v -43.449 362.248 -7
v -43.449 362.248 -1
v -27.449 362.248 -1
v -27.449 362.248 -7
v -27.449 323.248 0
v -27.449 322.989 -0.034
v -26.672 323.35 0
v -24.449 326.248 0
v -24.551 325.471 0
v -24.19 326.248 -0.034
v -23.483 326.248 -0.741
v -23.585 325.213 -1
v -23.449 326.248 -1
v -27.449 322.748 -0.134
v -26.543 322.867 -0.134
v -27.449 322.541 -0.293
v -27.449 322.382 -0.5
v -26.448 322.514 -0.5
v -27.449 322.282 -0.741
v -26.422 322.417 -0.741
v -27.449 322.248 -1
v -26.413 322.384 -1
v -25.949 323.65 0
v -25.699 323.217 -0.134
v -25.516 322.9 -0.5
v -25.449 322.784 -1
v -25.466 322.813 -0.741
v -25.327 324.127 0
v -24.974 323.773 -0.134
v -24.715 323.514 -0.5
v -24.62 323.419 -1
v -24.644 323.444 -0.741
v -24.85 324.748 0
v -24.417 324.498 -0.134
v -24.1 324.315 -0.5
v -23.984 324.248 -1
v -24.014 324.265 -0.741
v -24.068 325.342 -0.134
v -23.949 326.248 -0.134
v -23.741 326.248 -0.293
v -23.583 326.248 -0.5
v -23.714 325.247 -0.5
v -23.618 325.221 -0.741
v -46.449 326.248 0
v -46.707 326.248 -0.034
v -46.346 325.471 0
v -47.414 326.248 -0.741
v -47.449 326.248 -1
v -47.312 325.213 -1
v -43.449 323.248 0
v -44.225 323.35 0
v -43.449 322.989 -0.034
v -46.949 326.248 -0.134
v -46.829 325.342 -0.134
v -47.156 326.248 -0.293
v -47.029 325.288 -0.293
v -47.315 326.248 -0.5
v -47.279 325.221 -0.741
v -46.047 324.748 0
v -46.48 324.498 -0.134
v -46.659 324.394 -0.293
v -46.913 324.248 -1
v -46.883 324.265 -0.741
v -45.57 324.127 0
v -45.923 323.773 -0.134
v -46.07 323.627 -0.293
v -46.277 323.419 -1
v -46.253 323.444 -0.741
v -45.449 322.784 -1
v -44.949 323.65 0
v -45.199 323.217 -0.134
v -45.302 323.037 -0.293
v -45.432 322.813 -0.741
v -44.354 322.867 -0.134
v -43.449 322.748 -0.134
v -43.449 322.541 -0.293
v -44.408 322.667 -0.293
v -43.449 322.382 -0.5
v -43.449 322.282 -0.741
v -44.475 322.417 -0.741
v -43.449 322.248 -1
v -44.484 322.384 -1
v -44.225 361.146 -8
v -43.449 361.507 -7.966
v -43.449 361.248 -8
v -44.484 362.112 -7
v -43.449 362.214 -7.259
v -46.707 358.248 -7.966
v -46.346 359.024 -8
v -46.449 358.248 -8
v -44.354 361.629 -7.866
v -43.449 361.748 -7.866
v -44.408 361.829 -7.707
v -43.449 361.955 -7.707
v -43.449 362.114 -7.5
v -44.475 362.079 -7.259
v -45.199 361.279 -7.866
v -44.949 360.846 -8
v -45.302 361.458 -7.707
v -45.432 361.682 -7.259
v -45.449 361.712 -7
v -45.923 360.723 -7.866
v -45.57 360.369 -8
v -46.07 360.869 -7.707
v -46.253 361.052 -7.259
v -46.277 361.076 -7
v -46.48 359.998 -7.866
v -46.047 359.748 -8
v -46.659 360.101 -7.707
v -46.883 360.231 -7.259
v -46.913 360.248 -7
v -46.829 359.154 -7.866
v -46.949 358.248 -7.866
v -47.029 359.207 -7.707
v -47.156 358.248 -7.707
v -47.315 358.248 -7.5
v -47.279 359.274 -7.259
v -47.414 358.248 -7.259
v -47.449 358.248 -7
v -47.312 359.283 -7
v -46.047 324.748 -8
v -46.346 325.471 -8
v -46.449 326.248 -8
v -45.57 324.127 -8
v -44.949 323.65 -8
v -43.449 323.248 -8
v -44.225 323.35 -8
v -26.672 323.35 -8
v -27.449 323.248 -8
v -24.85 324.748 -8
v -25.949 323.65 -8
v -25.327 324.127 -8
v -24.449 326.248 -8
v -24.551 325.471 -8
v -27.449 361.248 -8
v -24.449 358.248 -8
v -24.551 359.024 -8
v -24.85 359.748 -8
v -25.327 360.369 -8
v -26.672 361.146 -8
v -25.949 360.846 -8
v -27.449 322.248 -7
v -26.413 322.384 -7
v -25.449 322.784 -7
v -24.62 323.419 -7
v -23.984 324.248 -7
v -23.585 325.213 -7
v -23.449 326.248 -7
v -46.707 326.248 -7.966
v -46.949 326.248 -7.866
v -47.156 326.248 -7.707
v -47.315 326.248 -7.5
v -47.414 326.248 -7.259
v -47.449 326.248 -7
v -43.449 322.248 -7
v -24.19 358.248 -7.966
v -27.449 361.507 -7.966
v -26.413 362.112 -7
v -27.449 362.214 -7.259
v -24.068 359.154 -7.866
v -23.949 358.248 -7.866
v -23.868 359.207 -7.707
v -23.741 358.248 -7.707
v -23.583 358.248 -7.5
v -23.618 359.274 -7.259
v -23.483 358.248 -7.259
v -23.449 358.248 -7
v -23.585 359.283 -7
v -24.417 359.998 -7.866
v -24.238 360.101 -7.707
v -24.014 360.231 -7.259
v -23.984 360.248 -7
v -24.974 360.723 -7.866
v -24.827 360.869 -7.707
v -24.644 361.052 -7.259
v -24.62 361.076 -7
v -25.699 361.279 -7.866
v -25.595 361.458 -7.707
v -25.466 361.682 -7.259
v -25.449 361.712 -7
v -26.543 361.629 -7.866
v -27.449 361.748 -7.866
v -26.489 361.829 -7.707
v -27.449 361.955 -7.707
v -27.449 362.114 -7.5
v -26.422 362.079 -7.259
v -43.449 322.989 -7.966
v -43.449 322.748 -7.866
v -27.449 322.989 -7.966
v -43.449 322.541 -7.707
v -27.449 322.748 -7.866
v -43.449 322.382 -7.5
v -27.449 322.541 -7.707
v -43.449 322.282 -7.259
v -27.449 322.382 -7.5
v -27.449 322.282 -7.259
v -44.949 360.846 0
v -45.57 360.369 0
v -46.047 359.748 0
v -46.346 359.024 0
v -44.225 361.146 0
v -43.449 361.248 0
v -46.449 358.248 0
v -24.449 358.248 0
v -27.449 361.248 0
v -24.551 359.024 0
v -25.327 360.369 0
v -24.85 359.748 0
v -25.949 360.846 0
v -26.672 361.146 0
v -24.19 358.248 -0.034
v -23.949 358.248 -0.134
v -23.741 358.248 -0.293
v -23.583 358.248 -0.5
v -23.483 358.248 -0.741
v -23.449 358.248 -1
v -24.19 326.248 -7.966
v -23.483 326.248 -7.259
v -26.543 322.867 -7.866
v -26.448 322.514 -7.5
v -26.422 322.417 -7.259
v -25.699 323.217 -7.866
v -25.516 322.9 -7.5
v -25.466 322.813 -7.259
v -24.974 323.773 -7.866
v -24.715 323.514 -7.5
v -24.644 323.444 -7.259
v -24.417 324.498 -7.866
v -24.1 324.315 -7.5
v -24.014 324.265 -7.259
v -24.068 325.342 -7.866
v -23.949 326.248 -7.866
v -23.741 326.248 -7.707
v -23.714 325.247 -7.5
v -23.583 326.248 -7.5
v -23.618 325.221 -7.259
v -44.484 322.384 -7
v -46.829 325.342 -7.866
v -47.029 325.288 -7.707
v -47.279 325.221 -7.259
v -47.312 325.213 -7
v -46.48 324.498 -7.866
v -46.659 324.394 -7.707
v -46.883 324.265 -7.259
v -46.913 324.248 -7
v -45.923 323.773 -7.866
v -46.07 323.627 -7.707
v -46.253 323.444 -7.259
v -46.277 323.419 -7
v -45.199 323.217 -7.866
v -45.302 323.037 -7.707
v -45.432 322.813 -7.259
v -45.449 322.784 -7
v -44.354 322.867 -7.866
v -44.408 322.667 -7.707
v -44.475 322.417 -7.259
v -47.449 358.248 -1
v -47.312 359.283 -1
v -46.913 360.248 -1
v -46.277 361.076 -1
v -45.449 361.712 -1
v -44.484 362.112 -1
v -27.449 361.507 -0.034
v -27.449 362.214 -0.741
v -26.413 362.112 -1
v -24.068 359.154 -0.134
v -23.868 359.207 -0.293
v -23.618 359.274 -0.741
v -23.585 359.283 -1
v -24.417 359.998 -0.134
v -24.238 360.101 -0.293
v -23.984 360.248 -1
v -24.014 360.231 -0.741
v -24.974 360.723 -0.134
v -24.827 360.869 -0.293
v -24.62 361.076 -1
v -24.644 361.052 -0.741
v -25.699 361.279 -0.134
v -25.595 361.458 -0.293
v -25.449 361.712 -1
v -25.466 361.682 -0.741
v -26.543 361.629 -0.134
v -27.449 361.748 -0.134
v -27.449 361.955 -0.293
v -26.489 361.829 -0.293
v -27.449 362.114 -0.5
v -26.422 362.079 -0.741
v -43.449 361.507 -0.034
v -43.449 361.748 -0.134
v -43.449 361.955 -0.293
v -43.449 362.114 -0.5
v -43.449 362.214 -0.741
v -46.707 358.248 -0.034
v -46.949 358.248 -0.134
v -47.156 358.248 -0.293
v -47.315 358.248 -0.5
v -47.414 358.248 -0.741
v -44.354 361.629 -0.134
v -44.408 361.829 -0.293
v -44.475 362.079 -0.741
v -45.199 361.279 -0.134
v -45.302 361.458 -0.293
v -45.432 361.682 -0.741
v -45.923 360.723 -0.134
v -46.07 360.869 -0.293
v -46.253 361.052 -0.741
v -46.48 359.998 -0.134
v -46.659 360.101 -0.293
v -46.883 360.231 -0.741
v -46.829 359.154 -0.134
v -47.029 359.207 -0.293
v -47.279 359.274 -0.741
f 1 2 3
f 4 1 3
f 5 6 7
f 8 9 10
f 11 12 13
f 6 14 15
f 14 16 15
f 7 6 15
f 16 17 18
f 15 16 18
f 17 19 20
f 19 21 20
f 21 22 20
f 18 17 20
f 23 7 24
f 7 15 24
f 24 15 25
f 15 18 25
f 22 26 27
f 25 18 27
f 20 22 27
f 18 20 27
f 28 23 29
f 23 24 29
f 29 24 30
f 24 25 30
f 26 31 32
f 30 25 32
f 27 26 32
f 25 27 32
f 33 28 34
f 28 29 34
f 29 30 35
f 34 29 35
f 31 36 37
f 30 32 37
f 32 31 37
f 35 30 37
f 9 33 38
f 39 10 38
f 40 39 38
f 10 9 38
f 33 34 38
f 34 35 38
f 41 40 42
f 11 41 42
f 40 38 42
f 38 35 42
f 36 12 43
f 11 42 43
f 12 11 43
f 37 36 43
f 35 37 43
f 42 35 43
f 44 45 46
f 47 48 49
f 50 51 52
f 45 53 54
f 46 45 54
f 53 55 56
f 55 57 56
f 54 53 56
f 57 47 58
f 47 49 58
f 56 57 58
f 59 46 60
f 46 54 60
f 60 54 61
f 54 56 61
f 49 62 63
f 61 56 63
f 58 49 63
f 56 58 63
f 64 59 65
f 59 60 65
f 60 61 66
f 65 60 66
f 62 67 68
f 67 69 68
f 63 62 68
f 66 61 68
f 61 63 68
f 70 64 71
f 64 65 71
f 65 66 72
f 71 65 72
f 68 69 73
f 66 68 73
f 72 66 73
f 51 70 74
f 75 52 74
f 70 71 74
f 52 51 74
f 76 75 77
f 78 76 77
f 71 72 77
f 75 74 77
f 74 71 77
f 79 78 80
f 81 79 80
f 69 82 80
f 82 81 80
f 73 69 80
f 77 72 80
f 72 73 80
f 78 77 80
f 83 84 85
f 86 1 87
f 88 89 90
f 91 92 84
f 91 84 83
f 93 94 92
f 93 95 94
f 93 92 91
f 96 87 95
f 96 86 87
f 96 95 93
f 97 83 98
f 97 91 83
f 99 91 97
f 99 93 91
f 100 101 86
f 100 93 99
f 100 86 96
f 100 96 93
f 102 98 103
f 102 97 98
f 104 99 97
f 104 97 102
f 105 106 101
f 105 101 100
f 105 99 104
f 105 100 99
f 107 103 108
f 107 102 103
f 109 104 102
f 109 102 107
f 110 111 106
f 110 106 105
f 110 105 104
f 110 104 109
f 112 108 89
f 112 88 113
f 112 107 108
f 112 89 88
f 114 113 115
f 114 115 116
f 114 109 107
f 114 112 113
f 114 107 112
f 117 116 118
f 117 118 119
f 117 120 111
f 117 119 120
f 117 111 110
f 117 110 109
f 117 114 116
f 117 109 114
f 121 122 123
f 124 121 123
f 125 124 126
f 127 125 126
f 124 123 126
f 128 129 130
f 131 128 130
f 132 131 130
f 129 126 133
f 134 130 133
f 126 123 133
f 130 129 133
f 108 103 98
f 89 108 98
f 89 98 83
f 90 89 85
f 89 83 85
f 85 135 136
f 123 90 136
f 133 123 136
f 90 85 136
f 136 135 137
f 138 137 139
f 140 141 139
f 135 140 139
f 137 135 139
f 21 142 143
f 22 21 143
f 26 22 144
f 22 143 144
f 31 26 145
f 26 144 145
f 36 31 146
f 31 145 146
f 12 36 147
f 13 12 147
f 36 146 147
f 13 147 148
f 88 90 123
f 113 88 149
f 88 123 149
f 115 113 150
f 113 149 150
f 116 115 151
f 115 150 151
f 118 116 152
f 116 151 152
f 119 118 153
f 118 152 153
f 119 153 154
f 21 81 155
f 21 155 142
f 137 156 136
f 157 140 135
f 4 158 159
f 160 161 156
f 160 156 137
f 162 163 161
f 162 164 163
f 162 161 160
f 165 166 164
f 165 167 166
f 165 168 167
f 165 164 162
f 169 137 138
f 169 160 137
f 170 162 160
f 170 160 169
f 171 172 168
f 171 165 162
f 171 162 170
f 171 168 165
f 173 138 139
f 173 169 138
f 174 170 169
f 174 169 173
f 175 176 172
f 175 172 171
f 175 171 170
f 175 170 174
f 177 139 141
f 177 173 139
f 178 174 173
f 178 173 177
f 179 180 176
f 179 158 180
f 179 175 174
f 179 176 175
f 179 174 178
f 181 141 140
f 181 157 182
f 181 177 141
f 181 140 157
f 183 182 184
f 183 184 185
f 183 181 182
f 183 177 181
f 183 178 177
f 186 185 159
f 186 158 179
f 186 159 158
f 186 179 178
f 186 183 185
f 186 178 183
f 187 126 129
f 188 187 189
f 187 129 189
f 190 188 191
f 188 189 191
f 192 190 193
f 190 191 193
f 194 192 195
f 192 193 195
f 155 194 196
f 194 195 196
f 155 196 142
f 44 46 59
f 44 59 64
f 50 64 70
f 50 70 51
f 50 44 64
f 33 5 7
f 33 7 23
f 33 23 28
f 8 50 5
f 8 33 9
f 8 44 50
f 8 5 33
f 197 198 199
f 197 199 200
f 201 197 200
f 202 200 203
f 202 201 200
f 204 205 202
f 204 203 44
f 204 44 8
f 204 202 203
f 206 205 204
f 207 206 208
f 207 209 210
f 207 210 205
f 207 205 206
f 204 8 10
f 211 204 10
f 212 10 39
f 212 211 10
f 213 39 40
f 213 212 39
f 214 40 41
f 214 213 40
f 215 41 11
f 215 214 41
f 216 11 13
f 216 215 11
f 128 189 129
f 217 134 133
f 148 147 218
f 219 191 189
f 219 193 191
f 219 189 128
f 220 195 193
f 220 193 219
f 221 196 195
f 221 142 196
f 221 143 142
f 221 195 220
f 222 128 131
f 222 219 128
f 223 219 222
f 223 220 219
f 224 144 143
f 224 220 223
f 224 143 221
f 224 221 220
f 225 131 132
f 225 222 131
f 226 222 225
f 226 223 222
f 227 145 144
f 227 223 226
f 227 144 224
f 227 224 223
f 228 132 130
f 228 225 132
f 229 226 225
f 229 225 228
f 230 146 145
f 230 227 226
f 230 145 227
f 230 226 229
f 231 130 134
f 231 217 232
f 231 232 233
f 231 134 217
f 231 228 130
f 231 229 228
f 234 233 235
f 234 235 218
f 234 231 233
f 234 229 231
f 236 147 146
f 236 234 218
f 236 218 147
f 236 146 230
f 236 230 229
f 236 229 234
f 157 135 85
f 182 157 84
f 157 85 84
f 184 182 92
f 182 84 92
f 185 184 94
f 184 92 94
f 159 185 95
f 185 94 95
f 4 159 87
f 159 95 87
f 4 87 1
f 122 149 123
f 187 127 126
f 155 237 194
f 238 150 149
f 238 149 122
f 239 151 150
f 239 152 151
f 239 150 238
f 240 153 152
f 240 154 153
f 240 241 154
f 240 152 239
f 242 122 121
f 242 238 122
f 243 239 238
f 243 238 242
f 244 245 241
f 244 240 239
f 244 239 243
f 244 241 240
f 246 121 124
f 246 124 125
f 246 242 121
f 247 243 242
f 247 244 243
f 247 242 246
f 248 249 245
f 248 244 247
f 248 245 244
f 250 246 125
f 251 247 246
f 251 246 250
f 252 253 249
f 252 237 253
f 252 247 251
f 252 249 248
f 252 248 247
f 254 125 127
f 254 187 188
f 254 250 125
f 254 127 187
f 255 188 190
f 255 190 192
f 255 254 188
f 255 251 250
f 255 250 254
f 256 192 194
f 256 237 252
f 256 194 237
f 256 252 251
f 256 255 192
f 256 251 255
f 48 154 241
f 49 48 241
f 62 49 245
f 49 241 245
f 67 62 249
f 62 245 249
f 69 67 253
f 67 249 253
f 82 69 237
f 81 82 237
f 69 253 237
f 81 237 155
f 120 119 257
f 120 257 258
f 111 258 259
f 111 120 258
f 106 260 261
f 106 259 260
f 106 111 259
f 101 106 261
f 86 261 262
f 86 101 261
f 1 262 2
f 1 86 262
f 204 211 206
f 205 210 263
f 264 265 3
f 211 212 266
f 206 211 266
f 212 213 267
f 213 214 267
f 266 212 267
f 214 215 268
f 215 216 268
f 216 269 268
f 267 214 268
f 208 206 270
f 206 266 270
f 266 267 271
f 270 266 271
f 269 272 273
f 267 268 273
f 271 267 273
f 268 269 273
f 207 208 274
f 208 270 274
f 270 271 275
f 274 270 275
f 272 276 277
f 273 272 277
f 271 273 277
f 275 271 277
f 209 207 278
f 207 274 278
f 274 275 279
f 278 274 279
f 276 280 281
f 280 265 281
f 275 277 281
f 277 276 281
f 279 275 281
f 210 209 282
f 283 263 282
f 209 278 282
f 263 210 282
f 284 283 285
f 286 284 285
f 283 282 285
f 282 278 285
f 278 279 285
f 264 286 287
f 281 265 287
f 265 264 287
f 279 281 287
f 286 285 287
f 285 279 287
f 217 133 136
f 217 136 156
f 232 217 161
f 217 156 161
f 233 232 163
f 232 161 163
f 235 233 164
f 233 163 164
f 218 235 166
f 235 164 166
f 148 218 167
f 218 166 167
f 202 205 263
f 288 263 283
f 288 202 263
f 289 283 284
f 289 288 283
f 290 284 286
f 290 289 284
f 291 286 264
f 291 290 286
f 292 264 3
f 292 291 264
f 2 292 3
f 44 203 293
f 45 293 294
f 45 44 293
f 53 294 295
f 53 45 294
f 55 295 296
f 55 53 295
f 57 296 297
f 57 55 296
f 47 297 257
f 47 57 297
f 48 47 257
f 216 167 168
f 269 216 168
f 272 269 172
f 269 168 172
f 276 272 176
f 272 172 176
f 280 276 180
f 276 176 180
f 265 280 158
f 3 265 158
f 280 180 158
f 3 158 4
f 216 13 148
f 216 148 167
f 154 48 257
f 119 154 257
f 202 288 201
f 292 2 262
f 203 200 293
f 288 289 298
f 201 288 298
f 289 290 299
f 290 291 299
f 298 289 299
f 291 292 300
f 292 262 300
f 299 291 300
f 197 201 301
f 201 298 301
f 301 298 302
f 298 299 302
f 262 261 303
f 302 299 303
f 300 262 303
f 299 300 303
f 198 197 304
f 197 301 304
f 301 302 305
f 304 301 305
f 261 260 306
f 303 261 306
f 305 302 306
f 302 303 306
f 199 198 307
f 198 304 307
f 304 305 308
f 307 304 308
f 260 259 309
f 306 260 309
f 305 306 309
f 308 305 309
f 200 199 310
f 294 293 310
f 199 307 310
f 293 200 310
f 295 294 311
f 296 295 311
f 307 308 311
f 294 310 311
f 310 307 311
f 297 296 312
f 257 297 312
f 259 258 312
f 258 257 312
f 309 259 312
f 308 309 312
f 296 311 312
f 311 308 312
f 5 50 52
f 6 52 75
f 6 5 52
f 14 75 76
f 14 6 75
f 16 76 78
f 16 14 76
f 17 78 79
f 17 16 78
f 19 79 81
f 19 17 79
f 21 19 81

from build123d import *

# Parameters (mm, degrees)
SKETCH1_W           = 24
SKETCH1_H           = 40
BOSS_EXTRUDE1_DEPTH = 8
FILLET1_R           = 4
FILLET2_R           = 1


with BuildPart() as part:
    # Sketch1 → Boss-Extrude1 (new body)
    with BuildSketch(Plane.XY):
        with Locations((-35.448560737, 342.247885871)):
            Rectangle(SKETCH1_W, SKETCH1_H)
    extrude(amount=-BOSS_EXTRUDE1_DEPTH)

    # Fillet1
    fillet1_edges = [part.edges().sort_by_distance(p)[0] for p in [
        (-47.448560737, 362.247885871, -4),
        (-23.448560737, 362.247885871, -4),
        (-23.448560737, 322.247885871, -4),
        (-47.448560737, 322.247885871, -4),
    ]]
    fillet(fillet1_edges, radius=FILLET1_R)

    # Fillet2
    fillet2_edges = [part.edges().sort_by_distance(p)[0] for p in [
        (-23.448560737, 342.247885871, 0),
        (-23.448560737, 342.247885871, -8),
        (-47.448560737, 342.247885871, 0),
        (-35.448560737, 322.247885871, 0),
        (-35.448560737, 362.247885871, 0),
        (-46.276987862, 361.076312996, 0),
        (-46.276987862, 323.419458746, 0),
        (-24.620133612, 323.419458746, 0),
        (-24.620133612, 361.076312996, 0),
        (-35.448560737, 362.247885871, -8),
        (-47.448560737, 342.247885871, -8),
        (-35.448560737, 322.247885871, -8),
        (-46.276987862, 361.076312996, -8),
        (-46.276987862, 323.419458746, -8),
        (-24.620133612, 323.419458746, -8),
        (-24.620133612, 361.076312996, -8),
    ]]
    fillet(fillet2_edges, radius=FILLET2_R)


solid = part.part
